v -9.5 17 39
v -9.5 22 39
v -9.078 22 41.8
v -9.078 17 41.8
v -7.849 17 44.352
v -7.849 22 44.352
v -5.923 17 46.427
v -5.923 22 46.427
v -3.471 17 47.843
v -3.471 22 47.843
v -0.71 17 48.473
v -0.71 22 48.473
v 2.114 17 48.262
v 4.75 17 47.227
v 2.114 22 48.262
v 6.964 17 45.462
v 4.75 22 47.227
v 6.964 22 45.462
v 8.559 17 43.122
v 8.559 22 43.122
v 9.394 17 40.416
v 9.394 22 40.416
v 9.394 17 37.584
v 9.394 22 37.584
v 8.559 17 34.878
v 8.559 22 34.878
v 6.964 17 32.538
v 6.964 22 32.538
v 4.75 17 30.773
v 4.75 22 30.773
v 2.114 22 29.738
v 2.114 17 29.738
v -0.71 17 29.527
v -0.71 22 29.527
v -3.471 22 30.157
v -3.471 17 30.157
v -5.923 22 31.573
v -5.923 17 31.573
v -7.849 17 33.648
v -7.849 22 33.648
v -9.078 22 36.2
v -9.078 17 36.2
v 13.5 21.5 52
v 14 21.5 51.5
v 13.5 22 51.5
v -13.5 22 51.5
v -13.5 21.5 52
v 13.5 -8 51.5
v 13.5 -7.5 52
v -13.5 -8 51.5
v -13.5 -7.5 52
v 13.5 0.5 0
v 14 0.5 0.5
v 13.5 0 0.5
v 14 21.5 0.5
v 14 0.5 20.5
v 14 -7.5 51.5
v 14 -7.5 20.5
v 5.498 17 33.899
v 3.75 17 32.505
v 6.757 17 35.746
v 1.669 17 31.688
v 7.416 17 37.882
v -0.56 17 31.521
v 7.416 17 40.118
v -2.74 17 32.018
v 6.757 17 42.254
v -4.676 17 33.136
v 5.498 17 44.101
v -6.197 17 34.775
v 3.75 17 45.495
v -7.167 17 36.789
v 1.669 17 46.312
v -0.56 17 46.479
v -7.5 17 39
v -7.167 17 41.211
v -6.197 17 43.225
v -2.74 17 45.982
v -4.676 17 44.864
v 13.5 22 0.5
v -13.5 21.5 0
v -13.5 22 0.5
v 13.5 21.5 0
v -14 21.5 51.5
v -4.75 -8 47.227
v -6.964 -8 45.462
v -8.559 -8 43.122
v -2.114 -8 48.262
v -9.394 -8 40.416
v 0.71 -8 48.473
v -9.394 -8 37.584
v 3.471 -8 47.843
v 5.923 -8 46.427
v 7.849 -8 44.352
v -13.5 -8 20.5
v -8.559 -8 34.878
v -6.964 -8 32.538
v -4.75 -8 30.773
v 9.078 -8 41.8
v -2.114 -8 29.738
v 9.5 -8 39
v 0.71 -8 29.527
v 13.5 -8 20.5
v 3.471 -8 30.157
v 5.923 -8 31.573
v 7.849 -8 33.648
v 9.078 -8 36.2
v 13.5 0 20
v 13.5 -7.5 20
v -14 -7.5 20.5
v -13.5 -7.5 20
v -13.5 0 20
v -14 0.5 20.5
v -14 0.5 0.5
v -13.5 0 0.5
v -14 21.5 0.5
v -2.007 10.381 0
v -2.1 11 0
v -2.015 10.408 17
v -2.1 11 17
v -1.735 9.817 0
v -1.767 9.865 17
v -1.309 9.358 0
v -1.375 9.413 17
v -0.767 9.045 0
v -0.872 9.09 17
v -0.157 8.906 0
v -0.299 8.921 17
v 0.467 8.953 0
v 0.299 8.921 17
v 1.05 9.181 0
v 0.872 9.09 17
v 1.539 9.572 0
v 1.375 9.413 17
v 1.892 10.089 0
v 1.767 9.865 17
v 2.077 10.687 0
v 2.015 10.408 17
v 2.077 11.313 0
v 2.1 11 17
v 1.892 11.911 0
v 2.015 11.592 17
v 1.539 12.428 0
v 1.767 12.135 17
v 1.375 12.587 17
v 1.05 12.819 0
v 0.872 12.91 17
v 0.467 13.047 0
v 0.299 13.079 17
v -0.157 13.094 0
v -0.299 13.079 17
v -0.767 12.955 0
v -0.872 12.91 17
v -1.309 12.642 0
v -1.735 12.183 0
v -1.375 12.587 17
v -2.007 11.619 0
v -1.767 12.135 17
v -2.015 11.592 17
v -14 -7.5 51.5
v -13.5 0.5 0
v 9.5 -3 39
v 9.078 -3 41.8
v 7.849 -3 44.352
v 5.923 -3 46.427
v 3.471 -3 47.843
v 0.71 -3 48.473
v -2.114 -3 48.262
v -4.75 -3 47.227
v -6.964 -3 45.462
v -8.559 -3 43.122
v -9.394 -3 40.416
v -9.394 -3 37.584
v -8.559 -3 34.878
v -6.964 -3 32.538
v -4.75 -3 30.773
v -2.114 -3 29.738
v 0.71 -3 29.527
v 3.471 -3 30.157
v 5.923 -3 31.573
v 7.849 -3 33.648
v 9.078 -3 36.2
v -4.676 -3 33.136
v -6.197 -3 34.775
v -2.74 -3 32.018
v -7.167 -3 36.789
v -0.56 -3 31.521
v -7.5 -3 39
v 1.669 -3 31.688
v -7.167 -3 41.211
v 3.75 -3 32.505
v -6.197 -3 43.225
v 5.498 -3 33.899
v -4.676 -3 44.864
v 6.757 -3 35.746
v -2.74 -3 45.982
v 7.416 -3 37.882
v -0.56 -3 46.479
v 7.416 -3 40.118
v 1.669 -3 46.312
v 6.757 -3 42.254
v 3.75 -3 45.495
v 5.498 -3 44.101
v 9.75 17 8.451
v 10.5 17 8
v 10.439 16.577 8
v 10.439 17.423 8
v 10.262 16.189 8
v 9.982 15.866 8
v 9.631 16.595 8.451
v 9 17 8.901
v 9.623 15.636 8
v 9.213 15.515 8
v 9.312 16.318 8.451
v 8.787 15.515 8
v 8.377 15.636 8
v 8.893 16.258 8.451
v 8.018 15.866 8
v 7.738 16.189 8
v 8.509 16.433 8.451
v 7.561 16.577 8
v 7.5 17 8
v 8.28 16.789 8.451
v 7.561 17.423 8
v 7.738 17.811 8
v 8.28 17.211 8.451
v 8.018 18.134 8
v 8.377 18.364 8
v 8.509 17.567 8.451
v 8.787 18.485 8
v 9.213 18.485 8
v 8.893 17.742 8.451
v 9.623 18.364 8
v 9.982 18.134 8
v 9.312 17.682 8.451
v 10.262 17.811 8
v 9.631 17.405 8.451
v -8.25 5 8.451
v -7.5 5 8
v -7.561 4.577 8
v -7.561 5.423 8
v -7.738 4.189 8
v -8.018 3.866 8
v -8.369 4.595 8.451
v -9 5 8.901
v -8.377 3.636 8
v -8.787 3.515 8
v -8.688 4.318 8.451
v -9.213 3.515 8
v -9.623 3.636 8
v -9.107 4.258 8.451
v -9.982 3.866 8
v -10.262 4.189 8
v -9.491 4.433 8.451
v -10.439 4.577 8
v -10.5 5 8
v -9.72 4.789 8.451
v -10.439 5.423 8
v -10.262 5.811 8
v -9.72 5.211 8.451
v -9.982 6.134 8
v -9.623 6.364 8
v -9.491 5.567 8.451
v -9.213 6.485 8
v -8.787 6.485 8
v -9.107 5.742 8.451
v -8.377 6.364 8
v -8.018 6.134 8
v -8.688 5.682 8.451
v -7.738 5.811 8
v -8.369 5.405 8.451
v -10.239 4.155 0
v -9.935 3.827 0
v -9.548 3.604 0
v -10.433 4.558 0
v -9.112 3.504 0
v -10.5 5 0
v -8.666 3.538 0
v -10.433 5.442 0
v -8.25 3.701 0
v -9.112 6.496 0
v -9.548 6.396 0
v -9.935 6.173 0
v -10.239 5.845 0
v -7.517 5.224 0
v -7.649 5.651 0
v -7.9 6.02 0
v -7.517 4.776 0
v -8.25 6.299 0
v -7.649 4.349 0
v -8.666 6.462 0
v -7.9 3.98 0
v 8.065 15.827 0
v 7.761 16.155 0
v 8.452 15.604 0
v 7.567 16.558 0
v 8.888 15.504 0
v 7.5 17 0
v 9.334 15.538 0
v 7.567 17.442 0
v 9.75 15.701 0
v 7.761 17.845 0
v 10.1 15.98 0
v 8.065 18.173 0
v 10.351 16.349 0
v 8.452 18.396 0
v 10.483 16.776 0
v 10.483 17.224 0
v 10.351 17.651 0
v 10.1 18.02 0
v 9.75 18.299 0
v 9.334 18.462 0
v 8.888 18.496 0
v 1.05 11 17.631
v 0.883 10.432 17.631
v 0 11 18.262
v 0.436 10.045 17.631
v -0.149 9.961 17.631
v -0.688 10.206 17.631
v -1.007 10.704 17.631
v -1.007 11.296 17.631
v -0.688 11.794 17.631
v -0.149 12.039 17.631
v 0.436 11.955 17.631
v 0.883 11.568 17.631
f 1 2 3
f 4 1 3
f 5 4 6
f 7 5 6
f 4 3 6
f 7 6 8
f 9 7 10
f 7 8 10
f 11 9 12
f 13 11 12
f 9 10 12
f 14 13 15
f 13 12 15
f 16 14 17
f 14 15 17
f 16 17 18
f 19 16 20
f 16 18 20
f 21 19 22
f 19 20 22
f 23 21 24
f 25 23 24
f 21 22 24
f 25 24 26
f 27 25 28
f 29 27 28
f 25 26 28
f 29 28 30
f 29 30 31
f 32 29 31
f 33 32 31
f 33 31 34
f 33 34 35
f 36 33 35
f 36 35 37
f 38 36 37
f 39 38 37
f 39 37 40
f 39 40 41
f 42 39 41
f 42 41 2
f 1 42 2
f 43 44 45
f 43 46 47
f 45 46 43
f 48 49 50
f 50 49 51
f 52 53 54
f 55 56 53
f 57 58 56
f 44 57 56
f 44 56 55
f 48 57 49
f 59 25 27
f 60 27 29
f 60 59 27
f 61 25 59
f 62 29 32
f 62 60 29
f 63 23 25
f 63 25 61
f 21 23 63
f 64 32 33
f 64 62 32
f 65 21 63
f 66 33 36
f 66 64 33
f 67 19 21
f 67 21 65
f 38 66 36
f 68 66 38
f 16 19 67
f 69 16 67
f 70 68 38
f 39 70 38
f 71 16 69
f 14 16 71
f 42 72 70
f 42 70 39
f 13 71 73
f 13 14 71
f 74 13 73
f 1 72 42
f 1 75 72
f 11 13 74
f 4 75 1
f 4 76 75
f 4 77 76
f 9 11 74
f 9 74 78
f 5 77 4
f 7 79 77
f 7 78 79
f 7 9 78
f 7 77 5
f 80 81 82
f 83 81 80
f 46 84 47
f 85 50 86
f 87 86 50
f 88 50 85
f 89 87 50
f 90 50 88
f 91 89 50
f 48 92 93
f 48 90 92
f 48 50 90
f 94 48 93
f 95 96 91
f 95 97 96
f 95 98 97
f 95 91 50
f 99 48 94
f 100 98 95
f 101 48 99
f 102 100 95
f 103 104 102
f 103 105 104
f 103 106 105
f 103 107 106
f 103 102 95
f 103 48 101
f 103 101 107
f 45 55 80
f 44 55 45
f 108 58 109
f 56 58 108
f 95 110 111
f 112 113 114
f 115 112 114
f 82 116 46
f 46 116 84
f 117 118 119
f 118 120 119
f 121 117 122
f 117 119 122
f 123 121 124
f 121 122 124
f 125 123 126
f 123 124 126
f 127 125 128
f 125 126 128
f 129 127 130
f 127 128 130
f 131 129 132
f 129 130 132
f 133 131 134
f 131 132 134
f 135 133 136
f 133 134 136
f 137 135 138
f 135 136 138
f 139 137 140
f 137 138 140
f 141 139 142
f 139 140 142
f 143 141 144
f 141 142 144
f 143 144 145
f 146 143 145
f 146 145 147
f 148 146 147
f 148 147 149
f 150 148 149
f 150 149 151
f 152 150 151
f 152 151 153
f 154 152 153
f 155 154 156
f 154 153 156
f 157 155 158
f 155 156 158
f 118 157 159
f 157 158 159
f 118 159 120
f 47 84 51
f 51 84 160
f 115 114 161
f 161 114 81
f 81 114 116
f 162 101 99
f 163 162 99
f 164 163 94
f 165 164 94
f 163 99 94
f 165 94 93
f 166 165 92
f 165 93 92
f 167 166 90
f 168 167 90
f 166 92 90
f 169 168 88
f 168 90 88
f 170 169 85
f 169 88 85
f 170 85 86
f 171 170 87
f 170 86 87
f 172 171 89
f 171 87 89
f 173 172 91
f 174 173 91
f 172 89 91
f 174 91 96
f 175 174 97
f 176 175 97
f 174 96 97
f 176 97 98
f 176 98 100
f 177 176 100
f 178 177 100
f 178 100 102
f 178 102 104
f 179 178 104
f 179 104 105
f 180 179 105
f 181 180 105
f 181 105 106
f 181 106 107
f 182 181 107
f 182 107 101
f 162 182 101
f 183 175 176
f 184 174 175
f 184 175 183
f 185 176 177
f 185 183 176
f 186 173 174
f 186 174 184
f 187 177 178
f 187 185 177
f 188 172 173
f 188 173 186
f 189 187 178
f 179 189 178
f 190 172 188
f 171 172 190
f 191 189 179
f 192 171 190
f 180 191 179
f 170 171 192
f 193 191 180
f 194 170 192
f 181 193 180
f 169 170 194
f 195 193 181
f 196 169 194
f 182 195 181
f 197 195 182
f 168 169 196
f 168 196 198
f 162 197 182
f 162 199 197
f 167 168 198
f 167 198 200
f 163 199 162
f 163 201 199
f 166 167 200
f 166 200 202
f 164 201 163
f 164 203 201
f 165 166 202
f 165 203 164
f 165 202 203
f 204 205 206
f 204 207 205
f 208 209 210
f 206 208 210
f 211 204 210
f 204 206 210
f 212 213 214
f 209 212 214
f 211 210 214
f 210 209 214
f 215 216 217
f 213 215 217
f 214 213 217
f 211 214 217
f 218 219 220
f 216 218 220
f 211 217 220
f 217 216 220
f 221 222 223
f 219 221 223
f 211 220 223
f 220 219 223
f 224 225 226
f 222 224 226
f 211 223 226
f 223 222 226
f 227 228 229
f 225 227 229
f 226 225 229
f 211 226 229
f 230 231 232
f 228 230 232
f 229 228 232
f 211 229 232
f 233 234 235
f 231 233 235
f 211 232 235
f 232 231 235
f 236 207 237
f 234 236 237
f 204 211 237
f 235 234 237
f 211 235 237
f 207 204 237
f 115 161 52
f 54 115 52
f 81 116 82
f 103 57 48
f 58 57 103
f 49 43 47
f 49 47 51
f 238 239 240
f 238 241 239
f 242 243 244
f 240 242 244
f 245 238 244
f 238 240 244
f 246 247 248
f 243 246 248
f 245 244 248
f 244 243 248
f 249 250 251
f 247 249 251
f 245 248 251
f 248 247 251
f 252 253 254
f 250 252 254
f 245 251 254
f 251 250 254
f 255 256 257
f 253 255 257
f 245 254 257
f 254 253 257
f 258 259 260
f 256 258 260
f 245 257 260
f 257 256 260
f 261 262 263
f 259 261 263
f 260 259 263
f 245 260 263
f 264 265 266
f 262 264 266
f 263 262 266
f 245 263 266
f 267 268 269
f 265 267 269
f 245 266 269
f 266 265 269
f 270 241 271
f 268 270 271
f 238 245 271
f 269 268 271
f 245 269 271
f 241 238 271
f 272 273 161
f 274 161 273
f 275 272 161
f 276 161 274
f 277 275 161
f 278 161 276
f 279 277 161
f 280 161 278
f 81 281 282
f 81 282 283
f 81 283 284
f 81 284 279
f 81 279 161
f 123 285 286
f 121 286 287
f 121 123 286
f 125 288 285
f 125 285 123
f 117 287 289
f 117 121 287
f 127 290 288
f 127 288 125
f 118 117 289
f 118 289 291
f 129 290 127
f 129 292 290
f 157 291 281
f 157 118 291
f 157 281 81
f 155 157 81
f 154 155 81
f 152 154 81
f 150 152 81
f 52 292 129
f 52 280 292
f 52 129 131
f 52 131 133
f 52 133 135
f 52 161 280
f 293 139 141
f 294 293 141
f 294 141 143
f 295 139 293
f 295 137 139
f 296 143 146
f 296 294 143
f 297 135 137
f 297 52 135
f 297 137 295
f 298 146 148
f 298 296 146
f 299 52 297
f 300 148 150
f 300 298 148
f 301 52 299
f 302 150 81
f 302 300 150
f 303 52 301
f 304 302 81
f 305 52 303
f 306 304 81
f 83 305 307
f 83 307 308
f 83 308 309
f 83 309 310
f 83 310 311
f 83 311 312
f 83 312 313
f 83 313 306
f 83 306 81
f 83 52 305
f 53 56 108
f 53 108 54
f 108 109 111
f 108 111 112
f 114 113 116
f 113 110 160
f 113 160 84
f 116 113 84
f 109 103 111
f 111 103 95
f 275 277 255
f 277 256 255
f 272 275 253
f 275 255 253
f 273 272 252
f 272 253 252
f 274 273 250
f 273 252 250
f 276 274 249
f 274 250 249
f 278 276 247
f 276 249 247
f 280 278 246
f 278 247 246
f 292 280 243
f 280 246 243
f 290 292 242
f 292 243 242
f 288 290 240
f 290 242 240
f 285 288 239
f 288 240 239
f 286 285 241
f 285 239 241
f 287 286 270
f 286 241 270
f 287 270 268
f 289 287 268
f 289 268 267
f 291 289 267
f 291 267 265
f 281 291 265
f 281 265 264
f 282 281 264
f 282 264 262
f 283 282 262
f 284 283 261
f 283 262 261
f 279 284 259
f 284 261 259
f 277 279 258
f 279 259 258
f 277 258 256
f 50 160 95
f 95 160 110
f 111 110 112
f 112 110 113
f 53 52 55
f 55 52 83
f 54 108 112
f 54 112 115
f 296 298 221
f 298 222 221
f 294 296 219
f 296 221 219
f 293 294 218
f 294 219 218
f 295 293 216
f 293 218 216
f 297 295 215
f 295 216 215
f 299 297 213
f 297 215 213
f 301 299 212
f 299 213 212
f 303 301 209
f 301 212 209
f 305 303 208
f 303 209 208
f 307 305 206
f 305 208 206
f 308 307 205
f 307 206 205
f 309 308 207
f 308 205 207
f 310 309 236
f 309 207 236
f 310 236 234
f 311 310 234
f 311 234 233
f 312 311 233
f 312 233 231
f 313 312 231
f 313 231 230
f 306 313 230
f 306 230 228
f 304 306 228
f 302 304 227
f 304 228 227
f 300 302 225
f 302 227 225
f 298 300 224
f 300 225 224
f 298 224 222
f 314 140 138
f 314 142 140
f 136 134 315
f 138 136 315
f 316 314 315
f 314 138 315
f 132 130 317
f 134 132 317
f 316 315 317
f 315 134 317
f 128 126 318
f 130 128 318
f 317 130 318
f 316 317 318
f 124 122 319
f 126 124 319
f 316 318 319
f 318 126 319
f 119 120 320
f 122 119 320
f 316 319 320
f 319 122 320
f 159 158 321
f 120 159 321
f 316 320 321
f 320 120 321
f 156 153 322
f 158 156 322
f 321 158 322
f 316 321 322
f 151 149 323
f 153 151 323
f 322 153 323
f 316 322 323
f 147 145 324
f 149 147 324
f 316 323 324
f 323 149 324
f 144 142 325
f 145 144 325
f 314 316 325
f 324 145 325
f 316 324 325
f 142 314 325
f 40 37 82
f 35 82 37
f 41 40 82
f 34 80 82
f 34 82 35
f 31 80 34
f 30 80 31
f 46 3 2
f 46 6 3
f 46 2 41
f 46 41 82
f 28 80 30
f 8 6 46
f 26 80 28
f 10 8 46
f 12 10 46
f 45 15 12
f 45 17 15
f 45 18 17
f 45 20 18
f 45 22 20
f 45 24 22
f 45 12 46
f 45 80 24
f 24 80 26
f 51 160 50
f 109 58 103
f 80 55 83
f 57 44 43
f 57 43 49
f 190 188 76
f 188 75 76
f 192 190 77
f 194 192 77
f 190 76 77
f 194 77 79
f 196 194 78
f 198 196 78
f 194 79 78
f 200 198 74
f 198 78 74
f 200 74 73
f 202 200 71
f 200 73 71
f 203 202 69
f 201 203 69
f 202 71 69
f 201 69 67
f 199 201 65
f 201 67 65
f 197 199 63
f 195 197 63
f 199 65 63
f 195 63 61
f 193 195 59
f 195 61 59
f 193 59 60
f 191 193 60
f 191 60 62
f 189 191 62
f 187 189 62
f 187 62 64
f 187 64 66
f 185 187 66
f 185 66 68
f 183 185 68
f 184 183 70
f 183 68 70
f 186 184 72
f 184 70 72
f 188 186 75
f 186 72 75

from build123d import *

# Parameters (mm, degrees)
F1_DEPTH       = 14
F2_SIZE        = 0.5
F4_D           = 15
F4_CBORE_D     = 19
F4_CBORE_DEPTH = 5
F6_D           = 15
F6_DEPTH       = 17
F6_CBORE_D     = 19
F6_CBORE_DEPTH = 5
F6_TIP         = 4.5064546427
F8_D           = 4.2
F8_DEPTH       = 17
F8_TIP         = 1.2618073
F9_D           = 3
F9_DEPTH       = 8
F9_TIP         = 0.9012909285


with BuildPart() as f1:
    # F0 (on Right) → F1 (new body, symmetric)
    with BuildSketch(Plane.YZ):
        Polygon((0, 20), (0, 0), (22, 0), (22, 52), (-8, 52), (-8, 20), align=None)
    extrude(amount=F1_DEPTH, both=True)

    # F2
    f2_edges = [f1.edges().sort_by_distance(p)[0] for p in [
        (14, 0, 10),
        (14, 11, 0),
        (14, 22, 26),
        (14, 7, 52),
        (14, -8, 36),
        (14, -4, 20),
        (-14, 0, 10),
        (-14, 11, 0),
        (-14, 22, 26),
        (-14, 7, 52),
        (-14, -8, 36),
        (-14, -4, 20),
        (0, 0, 0),
        (0, 22, 0),
        (0, 22, 52),
        (0, -8, 52),
        (0, -8, 20),
    ]]
    chamfer(f2_edges, length=F2_SIZE)

    # F4 (through all)
    with Locations(Plane.XZ.offset(8)):
        with Locations((0, 39)):
            CounterBoreHole(F4_D / 2, F4_CBORE_D / 2, F4_CBORE_DEPTH)

    # F6
    with Locations(Plane(origin=(0, 22, 0), x_dir=(-1, 0, 0), z_dir=(0, 1, 0))):
        with Locations((0, 39)):
            CounterBoreHole(F6_D / 2, F6_CBORE_D / 2, F6_CBORE_DEPTH, depth=F6_DEPTH)
            with Locations((0, 0, -(F6_DEPTH + F6_TIP / 2))):  # 118° drill point
                Cone(0, F6_D / 2, F6_TIP, mode=Mode.SUBTRACT)

    # F8
    with Locations(Plane(origin=(0, 0, 0), x_dir=(1, 0, 0), z_dir=(0, 0, -1))):
        with Locations((0, -11)):
            Hole(F8_D / 2, depth=F8_DEPTH)
            with Locations((0, 0, -(F8_DEPTH + F8_TIP / 2))):  # 118° drill point
                Cone(0, F8_D / 2, F8_TIP, mode=Mode.SUBTRACT)

    # F9
    with Locations(Plane(origin=(0, 0, 0), x_dir=(1, 0, 0), z_dir=(0, 0, -1))):
        with Locations((-9, -5), (9, -17)):
            Hole(F9_D / 2, depth=F9_DEPTH)
            with Locations((0, 0, -(F9_DEPTH + F9_TIP / 2))):  # 118° drill point
                Cone(0, F9_D / 2, F9_TIP, mode=Mode.SUBTRACT)


solid = f1.part
